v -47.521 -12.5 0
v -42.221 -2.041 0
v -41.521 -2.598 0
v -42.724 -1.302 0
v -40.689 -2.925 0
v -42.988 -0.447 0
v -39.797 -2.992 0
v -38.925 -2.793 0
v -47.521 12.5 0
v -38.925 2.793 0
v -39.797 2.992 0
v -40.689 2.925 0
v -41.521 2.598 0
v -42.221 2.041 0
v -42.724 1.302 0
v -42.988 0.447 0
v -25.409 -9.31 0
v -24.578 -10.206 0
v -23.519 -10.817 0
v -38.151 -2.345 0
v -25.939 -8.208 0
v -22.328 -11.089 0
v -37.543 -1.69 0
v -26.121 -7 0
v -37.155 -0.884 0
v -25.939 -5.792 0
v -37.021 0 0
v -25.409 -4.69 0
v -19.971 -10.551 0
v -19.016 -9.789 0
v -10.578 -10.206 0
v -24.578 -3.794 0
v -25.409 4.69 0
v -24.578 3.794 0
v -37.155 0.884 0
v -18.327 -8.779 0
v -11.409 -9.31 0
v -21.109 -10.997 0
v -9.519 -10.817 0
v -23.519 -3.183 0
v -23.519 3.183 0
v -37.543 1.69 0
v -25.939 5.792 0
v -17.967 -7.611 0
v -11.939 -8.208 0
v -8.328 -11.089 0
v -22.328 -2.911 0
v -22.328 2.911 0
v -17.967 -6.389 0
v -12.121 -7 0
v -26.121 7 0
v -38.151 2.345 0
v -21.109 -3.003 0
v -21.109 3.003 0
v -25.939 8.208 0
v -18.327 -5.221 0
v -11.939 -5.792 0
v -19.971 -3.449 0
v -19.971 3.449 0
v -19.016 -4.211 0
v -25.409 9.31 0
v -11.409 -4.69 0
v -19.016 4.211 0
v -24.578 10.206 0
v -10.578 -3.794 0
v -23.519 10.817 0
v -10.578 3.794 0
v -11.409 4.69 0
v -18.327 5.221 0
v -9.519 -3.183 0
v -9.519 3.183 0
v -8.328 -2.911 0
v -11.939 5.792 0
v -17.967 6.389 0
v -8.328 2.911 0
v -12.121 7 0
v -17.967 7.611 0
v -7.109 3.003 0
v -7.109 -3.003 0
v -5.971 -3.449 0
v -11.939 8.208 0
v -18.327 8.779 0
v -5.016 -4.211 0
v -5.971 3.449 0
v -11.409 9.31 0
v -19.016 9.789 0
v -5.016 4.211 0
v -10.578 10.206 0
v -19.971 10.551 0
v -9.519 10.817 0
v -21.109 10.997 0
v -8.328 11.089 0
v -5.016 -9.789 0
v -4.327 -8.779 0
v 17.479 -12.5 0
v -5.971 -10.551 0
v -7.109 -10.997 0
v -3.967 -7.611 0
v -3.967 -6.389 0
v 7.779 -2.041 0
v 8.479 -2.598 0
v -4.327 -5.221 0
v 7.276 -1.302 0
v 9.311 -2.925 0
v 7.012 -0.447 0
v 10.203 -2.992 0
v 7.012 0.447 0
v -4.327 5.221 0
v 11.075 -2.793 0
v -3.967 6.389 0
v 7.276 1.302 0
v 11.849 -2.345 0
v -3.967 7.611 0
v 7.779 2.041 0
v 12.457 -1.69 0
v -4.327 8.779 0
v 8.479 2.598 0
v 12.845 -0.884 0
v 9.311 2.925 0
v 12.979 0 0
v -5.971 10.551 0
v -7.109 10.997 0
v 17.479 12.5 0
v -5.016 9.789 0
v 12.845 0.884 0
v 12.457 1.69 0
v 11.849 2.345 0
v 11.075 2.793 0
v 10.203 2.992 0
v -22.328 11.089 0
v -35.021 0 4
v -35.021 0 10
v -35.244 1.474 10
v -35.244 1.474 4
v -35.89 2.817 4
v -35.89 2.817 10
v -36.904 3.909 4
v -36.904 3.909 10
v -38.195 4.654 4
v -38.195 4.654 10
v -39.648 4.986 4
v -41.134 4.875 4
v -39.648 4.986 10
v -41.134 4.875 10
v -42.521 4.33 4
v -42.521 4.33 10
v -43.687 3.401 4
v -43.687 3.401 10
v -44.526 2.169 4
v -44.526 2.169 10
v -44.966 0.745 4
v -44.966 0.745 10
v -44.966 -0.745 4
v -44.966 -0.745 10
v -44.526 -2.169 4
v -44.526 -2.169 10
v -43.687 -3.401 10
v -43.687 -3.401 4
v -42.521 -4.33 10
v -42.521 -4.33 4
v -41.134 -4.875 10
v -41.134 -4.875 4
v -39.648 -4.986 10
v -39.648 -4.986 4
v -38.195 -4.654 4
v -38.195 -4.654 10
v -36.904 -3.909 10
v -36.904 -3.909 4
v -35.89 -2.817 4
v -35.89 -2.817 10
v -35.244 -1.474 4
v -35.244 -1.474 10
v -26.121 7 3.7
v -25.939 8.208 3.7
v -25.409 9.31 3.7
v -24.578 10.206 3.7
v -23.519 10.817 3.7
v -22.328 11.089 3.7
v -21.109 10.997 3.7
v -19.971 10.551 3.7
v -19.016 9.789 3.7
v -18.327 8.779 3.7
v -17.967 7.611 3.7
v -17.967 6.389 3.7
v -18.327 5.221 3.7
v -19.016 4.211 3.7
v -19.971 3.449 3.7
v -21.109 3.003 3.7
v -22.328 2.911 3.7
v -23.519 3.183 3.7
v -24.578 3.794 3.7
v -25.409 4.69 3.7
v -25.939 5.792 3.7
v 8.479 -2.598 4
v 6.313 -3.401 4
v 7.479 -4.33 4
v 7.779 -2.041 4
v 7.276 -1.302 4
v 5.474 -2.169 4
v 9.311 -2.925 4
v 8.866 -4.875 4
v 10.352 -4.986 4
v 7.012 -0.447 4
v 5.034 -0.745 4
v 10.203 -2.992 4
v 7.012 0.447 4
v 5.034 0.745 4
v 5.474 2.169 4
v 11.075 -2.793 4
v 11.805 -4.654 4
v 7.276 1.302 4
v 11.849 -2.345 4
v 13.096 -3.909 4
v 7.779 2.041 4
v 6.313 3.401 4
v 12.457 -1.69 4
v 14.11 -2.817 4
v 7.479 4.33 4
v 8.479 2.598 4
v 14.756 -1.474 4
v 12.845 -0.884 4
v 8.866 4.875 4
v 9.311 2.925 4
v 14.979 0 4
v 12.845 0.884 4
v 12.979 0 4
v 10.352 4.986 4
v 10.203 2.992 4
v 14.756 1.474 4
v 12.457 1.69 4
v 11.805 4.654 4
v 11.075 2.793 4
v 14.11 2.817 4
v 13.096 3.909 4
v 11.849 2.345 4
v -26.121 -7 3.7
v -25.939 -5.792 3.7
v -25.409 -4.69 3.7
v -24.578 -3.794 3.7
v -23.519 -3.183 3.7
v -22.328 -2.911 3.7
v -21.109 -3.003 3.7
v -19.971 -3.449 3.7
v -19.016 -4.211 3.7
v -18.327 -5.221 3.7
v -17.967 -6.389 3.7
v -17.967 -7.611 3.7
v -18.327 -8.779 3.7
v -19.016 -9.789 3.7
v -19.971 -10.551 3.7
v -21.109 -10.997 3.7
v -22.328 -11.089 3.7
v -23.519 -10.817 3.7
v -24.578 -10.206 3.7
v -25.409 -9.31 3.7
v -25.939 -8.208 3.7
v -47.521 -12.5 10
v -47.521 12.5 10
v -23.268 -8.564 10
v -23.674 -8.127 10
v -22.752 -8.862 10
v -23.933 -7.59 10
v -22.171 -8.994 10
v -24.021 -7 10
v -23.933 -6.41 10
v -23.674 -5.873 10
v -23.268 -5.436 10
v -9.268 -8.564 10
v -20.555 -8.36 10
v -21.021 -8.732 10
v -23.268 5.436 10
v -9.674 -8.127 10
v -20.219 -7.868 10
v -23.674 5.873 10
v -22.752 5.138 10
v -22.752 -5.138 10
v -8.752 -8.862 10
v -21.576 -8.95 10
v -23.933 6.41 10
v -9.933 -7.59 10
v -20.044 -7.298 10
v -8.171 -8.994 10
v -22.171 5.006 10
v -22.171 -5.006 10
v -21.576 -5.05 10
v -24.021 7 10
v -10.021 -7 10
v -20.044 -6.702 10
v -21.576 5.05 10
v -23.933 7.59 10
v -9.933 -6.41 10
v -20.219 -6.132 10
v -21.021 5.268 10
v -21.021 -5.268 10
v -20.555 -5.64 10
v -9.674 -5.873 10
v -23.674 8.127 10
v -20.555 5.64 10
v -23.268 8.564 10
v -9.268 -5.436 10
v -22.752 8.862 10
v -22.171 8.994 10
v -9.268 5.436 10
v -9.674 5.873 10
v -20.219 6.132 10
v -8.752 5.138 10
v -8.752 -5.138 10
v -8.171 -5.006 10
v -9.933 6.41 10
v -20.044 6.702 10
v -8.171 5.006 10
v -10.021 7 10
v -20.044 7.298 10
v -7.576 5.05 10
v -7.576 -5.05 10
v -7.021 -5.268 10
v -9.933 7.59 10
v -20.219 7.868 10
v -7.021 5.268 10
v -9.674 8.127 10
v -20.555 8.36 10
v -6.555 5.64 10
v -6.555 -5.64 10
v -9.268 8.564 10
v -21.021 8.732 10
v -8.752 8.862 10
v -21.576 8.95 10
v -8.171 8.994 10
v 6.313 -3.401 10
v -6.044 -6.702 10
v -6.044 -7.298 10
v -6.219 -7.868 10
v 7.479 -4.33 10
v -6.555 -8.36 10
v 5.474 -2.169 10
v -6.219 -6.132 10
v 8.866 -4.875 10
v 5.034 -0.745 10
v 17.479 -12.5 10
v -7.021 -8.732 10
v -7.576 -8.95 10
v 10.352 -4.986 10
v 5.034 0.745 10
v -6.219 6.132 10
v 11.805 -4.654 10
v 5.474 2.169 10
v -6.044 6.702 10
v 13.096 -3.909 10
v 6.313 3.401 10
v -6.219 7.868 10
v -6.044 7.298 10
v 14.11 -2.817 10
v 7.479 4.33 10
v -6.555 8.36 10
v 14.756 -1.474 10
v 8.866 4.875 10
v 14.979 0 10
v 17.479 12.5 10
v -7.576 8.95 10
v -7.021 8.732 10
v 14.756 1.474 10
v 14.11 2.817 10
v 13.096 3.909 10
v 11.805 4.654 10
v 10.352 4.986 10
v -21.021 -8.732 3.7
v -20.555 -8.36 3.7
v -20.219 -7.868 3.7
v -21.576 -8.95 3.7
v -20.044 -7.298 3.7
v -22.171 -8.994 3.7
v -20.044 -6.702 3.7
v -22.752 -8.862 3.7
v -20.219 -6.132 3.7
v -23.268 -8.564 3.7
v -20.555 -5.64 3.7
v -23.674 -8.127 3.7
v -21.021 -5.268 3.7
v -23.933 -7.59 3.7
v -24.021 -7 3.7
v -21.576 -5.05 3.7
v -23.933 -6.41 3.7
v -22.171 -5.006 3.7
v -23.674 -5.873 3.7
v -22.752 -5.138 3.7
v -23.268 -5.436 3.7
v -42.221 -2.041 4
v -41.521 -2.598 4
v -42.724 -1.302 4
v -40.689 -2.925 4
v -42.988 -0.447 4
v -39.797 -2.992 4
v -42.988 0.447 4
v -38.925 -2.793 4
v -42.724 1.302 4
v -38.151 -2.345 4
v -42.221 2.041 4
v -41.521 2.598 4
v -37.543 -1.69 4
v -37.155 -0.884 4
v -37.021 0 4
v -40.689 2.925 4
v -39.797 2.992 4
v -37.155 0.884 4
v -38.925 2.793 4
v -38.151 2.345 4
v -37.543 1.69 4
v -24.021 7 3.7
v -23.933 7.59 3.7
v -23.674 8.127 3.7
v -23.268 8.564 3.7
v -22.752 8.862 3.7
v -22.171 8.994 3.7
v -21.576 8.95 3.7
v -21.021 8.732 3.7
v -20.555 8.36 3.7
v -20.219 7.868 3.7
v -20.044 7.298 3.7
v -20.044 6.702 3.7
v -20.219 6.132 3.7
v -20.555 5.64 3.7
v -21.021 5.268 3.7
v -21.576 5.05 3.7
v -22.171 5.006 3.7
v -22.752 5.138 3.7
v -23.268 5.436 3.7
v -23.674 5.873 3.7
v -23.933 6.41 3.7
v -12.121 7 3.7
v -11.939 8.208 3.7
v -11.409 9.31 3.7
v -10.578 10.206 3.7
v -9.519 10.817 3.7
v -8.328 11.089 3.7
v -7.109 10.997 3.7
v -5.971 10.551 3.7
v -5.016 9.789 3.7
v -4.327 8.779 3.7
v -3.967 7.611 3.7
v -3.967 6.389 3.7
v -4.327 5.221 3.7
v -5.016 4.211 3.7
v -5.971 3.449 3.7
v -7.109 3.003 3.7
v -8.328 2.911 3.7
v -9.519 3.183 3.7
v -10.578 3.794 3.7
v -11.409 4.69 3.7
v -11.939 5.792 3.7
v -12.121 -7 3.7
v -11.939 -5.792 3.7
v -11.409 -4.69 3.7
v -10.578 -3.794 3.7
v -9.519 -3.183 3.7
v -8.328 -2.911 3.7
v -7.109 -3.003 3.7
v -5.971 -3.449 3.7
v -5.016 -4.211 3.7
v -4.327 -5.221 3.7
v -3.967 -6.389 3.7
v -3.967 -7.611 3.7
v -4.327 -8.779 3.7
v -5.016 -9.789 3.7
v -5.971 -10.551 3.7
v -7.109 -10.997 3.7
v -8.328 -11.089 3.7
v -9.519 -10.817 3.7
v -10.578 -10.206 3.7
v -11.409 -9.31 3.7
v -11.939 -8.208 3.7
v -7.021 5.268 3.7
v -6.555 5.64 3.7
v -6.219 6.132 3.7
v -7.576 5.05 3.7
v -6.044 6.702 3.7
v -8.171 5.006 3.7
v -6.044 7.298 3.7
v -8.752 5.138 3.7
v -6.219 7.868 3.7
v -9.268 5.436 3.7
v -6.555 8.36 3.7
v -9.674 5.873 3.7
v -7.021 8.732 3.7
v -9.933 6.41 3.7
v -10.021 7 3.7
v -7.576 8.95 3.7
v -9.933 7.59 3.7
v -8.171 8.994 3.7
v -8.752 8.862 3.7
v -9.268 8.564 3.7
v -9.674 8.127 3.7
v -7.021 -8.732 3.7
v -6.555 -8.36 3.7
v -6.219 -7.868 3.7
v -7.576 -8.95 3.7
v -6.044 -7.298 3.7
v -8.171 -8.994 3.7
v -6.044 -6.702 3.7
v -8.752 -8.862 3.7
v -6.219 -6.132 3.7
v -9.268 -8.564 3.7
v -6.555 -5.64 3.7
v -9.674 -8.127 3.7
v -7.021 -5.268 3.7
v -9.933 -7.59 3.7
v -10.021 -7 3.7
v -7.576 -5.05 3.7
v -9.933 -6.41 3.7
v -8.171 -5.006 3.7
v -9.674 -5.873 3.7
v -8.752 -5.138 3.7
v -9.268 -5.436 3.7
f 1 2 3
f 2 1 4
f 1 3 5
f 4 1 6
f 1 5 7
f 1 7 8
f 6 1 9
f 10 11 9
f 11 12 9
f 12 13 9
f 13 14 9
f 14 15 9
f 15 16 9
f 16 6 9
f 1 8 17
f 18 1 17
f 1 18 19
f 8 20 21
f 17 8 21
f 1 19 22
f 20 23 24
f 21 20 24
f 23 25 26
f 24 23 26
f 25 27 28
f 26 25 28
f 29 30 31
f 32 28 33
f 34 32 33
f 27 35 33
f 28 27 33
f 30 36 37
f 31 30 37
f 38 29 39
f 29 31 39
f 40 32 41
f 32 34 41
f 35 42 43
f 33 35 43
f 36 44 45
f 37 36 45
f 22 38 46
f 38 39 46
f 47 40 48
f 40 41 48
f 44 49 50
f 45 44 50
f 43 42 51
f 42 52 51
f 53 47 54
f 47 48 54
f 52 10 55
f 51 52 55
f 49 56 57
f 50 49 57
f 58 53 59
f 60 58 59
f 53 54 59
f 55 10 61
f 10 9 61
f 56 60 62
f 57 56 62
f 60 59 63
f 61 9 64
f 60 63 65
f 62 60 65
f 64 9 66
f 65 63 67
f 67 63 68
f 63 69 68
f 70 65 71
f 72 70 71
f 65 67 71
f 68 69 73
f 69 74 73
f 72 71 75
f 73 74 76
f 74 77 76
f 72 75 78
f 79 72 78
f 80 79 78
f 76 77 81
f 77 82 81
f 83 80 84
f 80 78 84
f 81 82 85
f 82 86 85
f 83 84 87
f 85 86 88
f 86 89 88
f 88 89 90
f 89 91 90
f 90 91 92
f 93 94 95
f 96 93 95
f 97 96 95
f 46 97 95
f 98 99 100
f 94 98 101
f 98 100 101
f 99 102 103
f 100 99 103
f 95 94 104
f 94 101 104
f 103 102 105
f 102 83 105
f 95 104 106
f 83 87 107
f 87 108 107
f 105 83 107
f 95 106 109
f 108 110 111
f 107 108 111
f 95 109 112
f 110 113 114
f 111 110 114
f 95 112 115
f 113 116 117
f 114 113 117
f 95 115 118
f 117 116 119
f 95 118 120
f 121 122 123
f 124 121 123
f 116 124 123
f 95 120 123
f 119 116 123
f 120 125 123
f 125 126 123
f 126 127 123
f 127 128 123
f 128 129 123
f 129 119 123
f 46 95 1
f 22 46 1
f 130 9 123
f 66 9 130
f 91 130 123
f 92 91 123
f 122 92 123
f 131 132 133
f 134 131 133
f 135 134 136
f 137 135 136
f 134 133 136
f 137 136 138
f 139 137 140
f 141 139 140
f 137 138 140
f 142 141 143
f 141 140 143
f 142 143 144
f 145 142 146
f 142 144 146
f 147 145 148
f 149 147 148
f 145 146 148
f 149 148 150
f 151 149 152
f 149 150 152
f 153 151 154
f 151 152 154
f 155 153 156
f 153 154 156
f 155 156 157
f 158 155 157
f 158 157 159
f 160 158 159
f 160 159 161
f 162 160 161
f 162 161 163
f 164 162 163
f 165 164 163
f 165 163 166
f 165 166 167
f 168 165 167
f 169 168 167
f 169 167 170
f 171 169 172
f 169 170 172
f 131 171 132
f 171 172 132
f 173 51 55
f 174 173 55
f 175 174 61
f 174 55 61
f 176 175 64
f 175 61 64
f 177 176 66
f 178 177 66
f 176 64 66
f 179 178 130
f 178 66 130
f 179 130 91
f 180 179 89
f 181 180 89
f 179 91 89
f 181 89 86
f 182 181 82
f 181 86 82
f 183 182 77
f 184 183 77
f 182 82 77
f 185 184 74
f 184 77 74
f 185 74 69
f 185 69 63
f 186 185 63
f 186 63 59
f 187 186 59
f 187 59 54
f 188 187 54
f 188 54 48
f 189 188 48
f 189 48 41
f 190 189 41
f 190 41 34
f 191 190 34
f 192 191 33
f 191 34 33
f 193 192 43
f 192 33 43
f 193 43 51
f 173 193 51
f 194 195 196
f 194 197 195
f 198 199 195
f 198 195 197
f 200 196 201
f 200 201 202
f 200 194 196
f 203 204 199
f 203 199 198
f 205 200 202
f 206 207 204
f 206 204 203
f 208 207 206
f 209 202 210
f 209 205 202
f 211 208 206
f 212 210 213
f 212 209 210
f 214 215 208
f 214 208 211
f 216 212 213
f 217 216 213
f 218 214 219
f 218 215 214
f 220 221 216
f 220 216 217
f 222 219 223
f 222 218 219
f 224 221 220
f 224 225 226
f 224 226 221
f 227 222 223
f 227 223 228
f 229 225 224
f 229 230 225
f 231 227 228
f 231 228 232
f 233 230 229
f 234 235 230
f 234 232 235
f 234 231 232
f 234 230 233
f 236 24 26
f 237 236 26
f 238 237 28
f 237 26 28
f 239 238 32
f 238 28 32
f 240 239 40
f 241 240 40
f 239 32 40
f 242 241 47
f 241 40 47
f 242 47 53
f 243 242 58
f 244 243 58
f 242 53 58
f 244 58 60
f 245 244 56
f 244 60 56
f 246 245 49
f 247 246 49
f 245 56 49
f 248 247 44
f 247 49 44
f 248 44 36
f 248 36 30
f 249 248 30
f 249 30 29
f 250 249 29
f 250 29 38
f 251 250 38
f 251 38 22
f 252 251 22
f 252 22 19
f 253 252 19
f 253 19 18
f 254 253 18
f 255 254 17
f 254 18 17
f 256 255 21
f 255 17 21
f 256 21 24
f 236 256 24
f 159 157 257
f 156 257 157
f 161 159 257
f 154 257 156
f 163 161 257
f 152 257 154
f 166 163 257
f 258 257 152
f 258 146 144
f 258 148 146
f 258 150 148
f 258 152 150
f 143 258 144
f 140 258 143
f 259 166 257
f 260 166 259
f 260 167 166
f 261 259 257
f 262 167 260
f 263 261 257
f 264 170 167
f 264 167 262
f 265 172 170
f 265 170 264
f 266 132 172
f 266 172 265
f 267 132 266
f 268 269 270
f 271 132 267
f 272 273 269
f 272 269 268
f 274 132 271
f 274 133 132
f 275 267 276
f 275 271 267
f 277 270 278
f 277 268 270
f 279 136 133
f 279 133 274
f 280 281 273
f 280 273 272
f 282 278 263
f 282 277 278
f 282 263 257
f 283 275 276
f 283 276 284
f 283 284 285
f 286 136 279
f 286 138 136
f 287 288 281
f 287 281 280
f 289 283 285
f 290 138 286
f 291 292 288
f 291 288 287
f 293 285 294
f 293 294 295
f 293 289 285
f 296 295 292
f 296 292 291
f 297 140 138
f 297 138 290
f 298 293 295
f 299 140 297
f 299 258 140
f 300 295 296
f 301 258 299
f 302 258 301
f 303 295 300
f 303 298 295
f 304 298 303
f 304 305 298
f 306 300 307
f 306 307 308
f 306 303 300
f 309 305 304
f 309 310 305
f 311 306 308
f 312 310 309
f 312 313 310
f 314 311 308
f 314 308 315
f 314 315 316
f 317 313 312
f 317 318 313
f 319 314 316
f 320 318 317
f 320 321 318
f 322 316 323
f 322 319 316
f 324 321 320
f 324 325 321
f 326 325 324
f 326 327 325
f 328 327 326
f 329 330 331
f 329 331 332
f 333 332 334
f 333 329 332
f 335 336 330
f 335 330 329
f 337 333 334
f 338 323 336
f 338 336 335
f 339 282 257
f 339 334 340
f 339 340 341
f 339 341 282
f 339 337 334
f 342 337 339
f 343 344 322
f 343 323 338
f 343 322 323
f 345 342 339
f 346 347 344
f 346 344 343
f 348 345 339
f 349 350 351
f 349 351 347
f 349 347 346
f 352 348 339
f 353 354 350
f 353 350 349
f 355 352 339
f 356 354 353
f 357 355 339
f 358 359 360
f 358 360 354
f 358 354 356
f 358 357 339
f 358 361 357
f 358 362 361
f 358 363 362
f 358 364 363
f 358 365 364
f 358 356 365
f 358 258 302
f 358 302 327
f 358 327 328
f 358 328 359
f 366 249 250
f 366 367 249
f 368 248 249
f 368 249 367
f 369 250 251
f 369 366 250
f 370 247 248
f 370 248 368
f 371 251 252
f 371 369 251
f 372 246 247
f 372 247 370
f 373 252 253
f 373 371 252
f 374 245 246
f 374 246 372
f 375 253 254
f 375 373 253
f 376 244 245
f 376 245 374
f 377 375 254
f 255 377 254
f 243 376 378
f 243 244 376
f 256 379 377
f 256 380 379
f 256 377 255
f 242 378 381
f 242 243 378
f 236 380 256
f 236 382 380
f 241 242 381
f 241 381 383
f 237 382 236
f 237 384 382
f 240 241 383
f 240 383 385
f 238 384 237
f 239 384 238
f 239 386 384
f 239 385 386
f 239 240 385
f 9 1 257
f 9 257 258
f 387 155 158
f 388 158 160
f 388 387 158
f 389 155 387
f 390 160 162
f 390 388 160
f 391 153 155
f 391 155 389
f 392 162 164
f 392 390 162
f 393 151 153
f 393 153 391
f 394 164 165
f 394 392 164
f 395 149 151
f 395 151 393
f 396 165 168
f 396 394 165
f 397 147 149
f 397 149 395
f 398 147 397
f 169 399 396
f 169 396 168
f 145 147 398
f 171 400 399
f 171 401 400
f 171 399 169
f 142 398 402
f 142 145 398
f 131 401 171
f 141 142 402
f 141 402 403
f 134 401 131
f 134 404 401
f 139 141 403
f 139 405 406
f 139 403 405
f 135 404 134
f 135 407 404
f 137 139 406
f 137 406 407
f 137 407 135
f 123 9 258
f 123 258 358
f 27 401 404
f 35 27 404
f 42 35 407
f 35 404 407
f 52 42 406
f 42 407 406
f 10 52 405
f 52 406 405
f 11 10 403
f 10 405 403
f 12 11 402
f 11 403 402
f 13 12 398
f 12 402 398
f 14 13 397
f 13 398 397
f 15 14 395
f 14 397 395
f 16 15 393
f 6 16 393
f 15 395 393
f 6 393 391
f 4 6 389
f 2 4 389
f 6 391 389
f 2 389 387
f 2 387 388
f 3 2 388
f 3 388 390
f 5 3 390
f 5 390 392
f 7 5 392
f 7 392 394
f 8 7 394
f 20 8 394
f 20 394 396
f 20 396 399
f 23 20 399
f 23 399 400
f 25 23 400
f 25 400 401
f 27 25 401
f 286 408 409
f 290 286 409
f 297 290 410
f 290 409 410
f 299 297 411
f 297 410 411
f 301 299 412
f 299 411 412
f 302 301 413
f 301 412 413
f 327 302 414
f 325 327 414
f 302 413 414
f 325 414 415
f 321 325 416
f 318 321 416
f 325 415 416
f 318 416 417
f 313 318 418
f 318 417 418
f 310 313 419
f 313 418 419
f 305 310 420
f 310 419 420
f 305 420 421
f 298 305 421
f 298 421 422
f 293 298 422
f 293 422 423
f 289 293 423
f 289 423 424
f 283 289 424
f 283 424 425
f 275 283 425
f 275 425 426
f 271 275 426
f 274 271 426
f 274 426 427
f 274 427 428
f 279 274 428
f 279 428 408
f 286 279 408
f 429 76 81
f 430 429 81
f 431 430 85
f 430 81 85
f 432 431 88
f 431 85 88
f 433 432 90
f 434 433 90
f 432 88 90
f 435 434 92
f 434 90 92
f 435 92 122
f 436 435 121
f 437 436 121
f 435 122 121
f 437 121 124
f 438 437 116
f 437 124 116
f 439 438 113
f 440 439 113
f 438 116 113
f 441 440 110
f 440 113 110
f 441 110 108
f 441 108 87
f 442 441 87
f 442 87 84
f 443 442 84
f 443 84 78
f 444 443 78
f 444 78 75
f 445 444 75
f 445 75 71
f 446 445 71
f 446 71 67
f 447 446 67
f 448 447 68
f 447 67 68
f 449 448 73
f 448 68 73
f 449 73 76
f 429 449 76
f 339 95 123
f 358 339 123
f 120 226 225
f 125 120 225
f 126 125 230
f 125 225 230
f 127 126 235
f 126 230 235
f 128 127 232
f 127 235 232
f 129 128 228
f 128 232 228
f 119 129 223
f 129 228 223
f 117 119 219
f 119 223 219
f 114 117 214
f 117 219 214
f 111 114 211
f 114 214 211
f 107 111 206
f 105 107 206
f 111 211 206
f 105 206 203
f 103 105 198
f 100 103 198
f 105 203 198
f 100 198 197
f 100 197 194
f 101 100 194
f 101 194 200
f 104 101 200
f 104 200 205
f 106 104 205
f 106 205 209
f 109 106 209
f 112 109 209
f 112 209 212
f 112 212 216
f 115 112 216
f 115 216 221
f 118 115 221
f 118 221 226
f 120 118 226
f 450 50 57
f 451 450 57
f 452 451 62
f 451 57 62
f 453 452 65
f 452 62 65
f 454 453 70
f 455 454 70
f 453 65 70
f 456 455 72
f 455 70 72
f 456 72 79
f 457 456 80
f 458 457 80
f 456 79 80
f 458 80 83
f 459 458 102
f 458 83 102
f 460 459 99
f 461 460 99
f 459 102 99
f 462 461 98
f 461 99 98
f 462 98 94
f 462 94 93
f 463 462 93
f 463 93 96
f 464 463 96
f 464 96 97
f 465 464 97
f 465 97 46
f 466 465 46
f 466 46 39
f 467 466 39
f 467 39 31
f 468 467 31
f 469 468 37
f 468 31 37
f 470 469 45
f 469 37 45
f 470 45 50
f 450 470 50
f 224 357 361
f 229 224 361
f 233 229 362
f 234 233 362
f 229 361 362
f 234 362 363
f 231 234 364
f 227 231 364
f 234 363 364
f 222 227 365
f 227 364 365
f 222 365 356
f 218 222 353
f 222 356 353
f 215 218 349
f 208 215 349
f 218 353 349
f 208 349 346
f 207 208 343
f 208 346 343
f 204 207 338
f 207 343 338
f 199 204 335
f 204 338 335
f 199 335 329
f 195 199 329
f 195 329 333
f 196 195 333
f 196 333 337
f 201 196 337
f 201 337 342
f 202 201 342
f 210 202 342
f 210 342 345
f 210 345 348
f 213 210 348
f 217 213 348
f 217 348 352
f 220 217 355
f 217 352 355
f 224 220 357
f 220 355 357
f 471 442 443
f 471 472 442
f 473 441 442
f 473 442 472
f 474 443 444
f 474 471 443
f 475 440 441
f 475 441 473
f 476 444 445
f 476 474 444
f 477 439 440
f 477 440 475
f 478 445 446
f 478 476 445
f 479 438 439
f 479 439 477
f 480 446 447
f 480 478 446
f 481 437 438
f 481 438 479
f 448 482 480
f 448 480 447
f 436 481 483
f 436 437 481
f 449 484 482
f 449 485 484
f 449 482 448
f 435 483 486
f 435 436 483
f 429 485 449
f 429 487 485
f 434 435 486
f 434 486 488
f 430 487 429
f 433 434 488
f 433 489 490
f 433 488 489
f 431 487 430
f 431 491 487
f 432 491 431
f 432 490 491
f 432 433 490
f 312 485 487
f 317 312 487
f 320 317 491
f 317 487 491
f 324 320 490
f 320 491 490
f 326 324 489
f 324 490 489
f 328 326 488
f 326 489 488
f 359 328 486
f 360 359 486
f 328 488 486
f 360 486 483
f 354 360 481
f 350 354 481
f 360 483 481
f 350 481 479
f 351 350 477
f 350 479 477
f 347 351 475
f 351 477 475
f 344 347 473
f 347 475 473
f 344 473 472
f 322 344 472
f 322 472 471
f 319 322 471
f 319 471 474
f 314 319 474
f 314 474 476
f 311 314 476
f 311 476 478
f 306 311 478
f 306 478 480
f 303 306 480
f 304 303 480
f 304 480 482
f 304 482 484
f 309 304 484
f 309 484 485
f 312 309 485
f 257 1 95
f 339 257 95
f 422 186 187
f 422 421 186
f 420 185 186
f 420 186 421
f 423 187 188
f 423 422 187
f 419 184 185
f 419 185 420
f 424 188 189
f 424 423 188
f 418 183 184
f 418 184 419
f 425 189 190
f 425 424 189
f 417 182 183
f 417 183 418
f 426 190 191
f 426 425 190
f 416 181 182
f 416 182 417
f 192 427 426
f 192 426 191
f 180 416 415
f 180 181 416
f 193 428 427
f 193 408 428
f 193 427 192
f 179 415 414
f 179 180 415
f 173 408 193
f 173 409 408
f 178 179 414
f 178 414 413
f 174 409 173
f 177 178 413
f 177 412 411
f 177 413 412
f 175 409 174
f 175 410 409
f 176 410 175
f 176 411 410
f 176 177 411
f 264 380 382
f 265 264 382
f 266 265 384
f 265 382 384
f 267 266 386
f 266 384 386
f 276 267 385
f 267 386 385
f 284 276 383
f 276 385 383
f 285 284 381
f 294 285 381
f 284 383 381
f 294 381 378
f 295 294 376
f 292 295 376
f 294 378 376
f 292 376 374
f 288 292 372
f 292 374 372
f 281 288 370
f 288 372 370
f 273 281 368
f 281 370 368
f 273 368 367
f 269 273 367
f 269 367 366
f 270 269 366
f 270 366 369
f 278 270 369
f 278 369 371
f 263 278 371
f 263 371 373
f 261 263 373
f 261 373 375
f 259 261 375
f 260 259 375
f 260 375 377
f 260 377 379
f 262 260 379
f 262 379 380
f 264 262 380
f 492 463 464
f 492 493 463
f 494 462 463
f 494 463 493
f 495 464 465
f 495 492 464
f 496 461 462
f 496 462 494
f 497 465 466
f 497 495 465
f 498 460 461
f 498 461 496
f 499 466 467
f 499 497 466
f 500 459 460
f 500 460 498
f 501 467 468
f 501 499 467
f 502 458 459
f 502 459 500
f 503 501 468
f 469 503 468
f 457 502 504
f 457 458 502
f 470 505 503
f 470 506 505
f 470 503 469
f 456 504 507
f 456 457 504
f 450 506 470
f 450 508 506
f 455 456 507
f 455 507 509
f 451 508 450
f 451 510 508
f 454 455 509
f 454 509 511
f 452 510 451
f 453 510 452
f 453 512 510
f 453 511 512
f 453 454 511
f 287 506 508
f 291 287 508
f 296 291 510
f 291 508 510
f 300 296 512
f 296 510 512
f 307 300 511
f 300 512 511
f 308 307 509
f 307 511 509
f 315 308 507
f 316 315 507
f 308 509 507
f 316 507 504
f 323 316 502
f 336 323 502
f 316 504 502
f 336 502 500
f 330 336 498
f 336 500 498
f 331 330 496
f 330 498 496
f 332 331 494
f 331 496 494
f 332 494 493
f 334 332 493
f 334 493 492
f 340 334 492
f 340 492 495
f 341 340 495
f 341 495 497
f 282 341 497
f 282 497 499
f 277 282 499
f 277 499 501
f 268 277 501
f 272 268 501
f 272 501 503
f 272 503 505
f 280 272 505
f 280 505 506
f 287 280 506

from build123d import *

# Parameters (mm, degrees)
SKETCH1_W           = 65
SKETCH1_H           = 25
BOSS_EXTRUDE1_DEPTH = 10
SKETCH3_R           = 2
CUT_EXTRUDE1_DEPTH  = 10
SKETCH5_R           = 4.1
CUT_EXTRUDE2_DEPTH  = 3.7
SKETCH12_R          = 3
CUT_EXTRUDE3_DEPTH  = 24.2
SKETCH13_R          = 5
CUT_EXTRUDE4_DEPTH  = 6


with BuildPart() as part:
    # Sketch1 → Boss-Extrude1 (new body)
    with BuildSketch(Plane.XY):
        with Locations((-15.021367521, 0)):
            Rectangle(SKETCH1_W, SKETCH1_H)
    extrude(amount=BOSS_EXTRUDE1_DEPTH)

    # Sketch3 → Cut-Extrude1 (cut)
    with BuildSketch(Plane(origin=(0, 0, 0), x_dir=(-1, 0, 0), z_dir=(0, 0, -1))):
        with Locations((22.021367521, -7)):
            Circle(SKETCH3_R)
        with Locations((8.021367521, -7)):
            Circle(SKETCH3_R)
        with Locations((8.021367521, 7)):
            Circle(SKETCH3_R)
        with Locations((22.021367521, 7)):
            Circle(SKETCH3_R)
    extrude(amount=-CUT_EXTRUDE1_DEPTH, mode=Mode.SUBTRACT)

    # Sketch5 → Cut-Extrude2 (cut)
    with BuildSketch(Plane(origin=(0, 0, 0), x_dir=(-1, 0, 0), z_dir=(0, 0, -1))):
        with Locations((22.021367521, -7)):
            Circle(SKETCH5_R)
        with Locations((8.021367521, -7)):
            Circle(SKETCH5_R)
        with Locations((8.021367521, 7)):
            Circle(SKETCH5_R)
        with Locations((22.021367521, 7)):
            Circle(SKETCH5_R)
    extrude(amount=-CUT_EXTRUDE2_DEPTH, mode=Mode.SUBTRACT)

    # Sketch12 → Cut-Extrude3 (cut)
    with BuildSketch(Plane.XY.offset(10)):
        with Locations((-40.021367521, 0)):
            Circle(SKETCH12_R)
        with Locations((9.978632479, 0)):
            Circle(SKETCH12_R)
    extrude(amount=-CUT_EXTRUDE3_DEPTH, mode=Mode.SUBTRACT)

    # Sketch13 → Cut-Extrude4 (cut)
    with BuildSketch(Plane.XY.offset(10)):
        with Locations((-40.021367521, 0)):
            Circle(SKETCH13_R)
        with Locations((9.978632479, 0)):
            Circle(SKETCH13_R)
    extrude(amount=-CUT_EXTRUDE4_DEPTH, mode=Mode.SUBTRACT)


solid = part.part
